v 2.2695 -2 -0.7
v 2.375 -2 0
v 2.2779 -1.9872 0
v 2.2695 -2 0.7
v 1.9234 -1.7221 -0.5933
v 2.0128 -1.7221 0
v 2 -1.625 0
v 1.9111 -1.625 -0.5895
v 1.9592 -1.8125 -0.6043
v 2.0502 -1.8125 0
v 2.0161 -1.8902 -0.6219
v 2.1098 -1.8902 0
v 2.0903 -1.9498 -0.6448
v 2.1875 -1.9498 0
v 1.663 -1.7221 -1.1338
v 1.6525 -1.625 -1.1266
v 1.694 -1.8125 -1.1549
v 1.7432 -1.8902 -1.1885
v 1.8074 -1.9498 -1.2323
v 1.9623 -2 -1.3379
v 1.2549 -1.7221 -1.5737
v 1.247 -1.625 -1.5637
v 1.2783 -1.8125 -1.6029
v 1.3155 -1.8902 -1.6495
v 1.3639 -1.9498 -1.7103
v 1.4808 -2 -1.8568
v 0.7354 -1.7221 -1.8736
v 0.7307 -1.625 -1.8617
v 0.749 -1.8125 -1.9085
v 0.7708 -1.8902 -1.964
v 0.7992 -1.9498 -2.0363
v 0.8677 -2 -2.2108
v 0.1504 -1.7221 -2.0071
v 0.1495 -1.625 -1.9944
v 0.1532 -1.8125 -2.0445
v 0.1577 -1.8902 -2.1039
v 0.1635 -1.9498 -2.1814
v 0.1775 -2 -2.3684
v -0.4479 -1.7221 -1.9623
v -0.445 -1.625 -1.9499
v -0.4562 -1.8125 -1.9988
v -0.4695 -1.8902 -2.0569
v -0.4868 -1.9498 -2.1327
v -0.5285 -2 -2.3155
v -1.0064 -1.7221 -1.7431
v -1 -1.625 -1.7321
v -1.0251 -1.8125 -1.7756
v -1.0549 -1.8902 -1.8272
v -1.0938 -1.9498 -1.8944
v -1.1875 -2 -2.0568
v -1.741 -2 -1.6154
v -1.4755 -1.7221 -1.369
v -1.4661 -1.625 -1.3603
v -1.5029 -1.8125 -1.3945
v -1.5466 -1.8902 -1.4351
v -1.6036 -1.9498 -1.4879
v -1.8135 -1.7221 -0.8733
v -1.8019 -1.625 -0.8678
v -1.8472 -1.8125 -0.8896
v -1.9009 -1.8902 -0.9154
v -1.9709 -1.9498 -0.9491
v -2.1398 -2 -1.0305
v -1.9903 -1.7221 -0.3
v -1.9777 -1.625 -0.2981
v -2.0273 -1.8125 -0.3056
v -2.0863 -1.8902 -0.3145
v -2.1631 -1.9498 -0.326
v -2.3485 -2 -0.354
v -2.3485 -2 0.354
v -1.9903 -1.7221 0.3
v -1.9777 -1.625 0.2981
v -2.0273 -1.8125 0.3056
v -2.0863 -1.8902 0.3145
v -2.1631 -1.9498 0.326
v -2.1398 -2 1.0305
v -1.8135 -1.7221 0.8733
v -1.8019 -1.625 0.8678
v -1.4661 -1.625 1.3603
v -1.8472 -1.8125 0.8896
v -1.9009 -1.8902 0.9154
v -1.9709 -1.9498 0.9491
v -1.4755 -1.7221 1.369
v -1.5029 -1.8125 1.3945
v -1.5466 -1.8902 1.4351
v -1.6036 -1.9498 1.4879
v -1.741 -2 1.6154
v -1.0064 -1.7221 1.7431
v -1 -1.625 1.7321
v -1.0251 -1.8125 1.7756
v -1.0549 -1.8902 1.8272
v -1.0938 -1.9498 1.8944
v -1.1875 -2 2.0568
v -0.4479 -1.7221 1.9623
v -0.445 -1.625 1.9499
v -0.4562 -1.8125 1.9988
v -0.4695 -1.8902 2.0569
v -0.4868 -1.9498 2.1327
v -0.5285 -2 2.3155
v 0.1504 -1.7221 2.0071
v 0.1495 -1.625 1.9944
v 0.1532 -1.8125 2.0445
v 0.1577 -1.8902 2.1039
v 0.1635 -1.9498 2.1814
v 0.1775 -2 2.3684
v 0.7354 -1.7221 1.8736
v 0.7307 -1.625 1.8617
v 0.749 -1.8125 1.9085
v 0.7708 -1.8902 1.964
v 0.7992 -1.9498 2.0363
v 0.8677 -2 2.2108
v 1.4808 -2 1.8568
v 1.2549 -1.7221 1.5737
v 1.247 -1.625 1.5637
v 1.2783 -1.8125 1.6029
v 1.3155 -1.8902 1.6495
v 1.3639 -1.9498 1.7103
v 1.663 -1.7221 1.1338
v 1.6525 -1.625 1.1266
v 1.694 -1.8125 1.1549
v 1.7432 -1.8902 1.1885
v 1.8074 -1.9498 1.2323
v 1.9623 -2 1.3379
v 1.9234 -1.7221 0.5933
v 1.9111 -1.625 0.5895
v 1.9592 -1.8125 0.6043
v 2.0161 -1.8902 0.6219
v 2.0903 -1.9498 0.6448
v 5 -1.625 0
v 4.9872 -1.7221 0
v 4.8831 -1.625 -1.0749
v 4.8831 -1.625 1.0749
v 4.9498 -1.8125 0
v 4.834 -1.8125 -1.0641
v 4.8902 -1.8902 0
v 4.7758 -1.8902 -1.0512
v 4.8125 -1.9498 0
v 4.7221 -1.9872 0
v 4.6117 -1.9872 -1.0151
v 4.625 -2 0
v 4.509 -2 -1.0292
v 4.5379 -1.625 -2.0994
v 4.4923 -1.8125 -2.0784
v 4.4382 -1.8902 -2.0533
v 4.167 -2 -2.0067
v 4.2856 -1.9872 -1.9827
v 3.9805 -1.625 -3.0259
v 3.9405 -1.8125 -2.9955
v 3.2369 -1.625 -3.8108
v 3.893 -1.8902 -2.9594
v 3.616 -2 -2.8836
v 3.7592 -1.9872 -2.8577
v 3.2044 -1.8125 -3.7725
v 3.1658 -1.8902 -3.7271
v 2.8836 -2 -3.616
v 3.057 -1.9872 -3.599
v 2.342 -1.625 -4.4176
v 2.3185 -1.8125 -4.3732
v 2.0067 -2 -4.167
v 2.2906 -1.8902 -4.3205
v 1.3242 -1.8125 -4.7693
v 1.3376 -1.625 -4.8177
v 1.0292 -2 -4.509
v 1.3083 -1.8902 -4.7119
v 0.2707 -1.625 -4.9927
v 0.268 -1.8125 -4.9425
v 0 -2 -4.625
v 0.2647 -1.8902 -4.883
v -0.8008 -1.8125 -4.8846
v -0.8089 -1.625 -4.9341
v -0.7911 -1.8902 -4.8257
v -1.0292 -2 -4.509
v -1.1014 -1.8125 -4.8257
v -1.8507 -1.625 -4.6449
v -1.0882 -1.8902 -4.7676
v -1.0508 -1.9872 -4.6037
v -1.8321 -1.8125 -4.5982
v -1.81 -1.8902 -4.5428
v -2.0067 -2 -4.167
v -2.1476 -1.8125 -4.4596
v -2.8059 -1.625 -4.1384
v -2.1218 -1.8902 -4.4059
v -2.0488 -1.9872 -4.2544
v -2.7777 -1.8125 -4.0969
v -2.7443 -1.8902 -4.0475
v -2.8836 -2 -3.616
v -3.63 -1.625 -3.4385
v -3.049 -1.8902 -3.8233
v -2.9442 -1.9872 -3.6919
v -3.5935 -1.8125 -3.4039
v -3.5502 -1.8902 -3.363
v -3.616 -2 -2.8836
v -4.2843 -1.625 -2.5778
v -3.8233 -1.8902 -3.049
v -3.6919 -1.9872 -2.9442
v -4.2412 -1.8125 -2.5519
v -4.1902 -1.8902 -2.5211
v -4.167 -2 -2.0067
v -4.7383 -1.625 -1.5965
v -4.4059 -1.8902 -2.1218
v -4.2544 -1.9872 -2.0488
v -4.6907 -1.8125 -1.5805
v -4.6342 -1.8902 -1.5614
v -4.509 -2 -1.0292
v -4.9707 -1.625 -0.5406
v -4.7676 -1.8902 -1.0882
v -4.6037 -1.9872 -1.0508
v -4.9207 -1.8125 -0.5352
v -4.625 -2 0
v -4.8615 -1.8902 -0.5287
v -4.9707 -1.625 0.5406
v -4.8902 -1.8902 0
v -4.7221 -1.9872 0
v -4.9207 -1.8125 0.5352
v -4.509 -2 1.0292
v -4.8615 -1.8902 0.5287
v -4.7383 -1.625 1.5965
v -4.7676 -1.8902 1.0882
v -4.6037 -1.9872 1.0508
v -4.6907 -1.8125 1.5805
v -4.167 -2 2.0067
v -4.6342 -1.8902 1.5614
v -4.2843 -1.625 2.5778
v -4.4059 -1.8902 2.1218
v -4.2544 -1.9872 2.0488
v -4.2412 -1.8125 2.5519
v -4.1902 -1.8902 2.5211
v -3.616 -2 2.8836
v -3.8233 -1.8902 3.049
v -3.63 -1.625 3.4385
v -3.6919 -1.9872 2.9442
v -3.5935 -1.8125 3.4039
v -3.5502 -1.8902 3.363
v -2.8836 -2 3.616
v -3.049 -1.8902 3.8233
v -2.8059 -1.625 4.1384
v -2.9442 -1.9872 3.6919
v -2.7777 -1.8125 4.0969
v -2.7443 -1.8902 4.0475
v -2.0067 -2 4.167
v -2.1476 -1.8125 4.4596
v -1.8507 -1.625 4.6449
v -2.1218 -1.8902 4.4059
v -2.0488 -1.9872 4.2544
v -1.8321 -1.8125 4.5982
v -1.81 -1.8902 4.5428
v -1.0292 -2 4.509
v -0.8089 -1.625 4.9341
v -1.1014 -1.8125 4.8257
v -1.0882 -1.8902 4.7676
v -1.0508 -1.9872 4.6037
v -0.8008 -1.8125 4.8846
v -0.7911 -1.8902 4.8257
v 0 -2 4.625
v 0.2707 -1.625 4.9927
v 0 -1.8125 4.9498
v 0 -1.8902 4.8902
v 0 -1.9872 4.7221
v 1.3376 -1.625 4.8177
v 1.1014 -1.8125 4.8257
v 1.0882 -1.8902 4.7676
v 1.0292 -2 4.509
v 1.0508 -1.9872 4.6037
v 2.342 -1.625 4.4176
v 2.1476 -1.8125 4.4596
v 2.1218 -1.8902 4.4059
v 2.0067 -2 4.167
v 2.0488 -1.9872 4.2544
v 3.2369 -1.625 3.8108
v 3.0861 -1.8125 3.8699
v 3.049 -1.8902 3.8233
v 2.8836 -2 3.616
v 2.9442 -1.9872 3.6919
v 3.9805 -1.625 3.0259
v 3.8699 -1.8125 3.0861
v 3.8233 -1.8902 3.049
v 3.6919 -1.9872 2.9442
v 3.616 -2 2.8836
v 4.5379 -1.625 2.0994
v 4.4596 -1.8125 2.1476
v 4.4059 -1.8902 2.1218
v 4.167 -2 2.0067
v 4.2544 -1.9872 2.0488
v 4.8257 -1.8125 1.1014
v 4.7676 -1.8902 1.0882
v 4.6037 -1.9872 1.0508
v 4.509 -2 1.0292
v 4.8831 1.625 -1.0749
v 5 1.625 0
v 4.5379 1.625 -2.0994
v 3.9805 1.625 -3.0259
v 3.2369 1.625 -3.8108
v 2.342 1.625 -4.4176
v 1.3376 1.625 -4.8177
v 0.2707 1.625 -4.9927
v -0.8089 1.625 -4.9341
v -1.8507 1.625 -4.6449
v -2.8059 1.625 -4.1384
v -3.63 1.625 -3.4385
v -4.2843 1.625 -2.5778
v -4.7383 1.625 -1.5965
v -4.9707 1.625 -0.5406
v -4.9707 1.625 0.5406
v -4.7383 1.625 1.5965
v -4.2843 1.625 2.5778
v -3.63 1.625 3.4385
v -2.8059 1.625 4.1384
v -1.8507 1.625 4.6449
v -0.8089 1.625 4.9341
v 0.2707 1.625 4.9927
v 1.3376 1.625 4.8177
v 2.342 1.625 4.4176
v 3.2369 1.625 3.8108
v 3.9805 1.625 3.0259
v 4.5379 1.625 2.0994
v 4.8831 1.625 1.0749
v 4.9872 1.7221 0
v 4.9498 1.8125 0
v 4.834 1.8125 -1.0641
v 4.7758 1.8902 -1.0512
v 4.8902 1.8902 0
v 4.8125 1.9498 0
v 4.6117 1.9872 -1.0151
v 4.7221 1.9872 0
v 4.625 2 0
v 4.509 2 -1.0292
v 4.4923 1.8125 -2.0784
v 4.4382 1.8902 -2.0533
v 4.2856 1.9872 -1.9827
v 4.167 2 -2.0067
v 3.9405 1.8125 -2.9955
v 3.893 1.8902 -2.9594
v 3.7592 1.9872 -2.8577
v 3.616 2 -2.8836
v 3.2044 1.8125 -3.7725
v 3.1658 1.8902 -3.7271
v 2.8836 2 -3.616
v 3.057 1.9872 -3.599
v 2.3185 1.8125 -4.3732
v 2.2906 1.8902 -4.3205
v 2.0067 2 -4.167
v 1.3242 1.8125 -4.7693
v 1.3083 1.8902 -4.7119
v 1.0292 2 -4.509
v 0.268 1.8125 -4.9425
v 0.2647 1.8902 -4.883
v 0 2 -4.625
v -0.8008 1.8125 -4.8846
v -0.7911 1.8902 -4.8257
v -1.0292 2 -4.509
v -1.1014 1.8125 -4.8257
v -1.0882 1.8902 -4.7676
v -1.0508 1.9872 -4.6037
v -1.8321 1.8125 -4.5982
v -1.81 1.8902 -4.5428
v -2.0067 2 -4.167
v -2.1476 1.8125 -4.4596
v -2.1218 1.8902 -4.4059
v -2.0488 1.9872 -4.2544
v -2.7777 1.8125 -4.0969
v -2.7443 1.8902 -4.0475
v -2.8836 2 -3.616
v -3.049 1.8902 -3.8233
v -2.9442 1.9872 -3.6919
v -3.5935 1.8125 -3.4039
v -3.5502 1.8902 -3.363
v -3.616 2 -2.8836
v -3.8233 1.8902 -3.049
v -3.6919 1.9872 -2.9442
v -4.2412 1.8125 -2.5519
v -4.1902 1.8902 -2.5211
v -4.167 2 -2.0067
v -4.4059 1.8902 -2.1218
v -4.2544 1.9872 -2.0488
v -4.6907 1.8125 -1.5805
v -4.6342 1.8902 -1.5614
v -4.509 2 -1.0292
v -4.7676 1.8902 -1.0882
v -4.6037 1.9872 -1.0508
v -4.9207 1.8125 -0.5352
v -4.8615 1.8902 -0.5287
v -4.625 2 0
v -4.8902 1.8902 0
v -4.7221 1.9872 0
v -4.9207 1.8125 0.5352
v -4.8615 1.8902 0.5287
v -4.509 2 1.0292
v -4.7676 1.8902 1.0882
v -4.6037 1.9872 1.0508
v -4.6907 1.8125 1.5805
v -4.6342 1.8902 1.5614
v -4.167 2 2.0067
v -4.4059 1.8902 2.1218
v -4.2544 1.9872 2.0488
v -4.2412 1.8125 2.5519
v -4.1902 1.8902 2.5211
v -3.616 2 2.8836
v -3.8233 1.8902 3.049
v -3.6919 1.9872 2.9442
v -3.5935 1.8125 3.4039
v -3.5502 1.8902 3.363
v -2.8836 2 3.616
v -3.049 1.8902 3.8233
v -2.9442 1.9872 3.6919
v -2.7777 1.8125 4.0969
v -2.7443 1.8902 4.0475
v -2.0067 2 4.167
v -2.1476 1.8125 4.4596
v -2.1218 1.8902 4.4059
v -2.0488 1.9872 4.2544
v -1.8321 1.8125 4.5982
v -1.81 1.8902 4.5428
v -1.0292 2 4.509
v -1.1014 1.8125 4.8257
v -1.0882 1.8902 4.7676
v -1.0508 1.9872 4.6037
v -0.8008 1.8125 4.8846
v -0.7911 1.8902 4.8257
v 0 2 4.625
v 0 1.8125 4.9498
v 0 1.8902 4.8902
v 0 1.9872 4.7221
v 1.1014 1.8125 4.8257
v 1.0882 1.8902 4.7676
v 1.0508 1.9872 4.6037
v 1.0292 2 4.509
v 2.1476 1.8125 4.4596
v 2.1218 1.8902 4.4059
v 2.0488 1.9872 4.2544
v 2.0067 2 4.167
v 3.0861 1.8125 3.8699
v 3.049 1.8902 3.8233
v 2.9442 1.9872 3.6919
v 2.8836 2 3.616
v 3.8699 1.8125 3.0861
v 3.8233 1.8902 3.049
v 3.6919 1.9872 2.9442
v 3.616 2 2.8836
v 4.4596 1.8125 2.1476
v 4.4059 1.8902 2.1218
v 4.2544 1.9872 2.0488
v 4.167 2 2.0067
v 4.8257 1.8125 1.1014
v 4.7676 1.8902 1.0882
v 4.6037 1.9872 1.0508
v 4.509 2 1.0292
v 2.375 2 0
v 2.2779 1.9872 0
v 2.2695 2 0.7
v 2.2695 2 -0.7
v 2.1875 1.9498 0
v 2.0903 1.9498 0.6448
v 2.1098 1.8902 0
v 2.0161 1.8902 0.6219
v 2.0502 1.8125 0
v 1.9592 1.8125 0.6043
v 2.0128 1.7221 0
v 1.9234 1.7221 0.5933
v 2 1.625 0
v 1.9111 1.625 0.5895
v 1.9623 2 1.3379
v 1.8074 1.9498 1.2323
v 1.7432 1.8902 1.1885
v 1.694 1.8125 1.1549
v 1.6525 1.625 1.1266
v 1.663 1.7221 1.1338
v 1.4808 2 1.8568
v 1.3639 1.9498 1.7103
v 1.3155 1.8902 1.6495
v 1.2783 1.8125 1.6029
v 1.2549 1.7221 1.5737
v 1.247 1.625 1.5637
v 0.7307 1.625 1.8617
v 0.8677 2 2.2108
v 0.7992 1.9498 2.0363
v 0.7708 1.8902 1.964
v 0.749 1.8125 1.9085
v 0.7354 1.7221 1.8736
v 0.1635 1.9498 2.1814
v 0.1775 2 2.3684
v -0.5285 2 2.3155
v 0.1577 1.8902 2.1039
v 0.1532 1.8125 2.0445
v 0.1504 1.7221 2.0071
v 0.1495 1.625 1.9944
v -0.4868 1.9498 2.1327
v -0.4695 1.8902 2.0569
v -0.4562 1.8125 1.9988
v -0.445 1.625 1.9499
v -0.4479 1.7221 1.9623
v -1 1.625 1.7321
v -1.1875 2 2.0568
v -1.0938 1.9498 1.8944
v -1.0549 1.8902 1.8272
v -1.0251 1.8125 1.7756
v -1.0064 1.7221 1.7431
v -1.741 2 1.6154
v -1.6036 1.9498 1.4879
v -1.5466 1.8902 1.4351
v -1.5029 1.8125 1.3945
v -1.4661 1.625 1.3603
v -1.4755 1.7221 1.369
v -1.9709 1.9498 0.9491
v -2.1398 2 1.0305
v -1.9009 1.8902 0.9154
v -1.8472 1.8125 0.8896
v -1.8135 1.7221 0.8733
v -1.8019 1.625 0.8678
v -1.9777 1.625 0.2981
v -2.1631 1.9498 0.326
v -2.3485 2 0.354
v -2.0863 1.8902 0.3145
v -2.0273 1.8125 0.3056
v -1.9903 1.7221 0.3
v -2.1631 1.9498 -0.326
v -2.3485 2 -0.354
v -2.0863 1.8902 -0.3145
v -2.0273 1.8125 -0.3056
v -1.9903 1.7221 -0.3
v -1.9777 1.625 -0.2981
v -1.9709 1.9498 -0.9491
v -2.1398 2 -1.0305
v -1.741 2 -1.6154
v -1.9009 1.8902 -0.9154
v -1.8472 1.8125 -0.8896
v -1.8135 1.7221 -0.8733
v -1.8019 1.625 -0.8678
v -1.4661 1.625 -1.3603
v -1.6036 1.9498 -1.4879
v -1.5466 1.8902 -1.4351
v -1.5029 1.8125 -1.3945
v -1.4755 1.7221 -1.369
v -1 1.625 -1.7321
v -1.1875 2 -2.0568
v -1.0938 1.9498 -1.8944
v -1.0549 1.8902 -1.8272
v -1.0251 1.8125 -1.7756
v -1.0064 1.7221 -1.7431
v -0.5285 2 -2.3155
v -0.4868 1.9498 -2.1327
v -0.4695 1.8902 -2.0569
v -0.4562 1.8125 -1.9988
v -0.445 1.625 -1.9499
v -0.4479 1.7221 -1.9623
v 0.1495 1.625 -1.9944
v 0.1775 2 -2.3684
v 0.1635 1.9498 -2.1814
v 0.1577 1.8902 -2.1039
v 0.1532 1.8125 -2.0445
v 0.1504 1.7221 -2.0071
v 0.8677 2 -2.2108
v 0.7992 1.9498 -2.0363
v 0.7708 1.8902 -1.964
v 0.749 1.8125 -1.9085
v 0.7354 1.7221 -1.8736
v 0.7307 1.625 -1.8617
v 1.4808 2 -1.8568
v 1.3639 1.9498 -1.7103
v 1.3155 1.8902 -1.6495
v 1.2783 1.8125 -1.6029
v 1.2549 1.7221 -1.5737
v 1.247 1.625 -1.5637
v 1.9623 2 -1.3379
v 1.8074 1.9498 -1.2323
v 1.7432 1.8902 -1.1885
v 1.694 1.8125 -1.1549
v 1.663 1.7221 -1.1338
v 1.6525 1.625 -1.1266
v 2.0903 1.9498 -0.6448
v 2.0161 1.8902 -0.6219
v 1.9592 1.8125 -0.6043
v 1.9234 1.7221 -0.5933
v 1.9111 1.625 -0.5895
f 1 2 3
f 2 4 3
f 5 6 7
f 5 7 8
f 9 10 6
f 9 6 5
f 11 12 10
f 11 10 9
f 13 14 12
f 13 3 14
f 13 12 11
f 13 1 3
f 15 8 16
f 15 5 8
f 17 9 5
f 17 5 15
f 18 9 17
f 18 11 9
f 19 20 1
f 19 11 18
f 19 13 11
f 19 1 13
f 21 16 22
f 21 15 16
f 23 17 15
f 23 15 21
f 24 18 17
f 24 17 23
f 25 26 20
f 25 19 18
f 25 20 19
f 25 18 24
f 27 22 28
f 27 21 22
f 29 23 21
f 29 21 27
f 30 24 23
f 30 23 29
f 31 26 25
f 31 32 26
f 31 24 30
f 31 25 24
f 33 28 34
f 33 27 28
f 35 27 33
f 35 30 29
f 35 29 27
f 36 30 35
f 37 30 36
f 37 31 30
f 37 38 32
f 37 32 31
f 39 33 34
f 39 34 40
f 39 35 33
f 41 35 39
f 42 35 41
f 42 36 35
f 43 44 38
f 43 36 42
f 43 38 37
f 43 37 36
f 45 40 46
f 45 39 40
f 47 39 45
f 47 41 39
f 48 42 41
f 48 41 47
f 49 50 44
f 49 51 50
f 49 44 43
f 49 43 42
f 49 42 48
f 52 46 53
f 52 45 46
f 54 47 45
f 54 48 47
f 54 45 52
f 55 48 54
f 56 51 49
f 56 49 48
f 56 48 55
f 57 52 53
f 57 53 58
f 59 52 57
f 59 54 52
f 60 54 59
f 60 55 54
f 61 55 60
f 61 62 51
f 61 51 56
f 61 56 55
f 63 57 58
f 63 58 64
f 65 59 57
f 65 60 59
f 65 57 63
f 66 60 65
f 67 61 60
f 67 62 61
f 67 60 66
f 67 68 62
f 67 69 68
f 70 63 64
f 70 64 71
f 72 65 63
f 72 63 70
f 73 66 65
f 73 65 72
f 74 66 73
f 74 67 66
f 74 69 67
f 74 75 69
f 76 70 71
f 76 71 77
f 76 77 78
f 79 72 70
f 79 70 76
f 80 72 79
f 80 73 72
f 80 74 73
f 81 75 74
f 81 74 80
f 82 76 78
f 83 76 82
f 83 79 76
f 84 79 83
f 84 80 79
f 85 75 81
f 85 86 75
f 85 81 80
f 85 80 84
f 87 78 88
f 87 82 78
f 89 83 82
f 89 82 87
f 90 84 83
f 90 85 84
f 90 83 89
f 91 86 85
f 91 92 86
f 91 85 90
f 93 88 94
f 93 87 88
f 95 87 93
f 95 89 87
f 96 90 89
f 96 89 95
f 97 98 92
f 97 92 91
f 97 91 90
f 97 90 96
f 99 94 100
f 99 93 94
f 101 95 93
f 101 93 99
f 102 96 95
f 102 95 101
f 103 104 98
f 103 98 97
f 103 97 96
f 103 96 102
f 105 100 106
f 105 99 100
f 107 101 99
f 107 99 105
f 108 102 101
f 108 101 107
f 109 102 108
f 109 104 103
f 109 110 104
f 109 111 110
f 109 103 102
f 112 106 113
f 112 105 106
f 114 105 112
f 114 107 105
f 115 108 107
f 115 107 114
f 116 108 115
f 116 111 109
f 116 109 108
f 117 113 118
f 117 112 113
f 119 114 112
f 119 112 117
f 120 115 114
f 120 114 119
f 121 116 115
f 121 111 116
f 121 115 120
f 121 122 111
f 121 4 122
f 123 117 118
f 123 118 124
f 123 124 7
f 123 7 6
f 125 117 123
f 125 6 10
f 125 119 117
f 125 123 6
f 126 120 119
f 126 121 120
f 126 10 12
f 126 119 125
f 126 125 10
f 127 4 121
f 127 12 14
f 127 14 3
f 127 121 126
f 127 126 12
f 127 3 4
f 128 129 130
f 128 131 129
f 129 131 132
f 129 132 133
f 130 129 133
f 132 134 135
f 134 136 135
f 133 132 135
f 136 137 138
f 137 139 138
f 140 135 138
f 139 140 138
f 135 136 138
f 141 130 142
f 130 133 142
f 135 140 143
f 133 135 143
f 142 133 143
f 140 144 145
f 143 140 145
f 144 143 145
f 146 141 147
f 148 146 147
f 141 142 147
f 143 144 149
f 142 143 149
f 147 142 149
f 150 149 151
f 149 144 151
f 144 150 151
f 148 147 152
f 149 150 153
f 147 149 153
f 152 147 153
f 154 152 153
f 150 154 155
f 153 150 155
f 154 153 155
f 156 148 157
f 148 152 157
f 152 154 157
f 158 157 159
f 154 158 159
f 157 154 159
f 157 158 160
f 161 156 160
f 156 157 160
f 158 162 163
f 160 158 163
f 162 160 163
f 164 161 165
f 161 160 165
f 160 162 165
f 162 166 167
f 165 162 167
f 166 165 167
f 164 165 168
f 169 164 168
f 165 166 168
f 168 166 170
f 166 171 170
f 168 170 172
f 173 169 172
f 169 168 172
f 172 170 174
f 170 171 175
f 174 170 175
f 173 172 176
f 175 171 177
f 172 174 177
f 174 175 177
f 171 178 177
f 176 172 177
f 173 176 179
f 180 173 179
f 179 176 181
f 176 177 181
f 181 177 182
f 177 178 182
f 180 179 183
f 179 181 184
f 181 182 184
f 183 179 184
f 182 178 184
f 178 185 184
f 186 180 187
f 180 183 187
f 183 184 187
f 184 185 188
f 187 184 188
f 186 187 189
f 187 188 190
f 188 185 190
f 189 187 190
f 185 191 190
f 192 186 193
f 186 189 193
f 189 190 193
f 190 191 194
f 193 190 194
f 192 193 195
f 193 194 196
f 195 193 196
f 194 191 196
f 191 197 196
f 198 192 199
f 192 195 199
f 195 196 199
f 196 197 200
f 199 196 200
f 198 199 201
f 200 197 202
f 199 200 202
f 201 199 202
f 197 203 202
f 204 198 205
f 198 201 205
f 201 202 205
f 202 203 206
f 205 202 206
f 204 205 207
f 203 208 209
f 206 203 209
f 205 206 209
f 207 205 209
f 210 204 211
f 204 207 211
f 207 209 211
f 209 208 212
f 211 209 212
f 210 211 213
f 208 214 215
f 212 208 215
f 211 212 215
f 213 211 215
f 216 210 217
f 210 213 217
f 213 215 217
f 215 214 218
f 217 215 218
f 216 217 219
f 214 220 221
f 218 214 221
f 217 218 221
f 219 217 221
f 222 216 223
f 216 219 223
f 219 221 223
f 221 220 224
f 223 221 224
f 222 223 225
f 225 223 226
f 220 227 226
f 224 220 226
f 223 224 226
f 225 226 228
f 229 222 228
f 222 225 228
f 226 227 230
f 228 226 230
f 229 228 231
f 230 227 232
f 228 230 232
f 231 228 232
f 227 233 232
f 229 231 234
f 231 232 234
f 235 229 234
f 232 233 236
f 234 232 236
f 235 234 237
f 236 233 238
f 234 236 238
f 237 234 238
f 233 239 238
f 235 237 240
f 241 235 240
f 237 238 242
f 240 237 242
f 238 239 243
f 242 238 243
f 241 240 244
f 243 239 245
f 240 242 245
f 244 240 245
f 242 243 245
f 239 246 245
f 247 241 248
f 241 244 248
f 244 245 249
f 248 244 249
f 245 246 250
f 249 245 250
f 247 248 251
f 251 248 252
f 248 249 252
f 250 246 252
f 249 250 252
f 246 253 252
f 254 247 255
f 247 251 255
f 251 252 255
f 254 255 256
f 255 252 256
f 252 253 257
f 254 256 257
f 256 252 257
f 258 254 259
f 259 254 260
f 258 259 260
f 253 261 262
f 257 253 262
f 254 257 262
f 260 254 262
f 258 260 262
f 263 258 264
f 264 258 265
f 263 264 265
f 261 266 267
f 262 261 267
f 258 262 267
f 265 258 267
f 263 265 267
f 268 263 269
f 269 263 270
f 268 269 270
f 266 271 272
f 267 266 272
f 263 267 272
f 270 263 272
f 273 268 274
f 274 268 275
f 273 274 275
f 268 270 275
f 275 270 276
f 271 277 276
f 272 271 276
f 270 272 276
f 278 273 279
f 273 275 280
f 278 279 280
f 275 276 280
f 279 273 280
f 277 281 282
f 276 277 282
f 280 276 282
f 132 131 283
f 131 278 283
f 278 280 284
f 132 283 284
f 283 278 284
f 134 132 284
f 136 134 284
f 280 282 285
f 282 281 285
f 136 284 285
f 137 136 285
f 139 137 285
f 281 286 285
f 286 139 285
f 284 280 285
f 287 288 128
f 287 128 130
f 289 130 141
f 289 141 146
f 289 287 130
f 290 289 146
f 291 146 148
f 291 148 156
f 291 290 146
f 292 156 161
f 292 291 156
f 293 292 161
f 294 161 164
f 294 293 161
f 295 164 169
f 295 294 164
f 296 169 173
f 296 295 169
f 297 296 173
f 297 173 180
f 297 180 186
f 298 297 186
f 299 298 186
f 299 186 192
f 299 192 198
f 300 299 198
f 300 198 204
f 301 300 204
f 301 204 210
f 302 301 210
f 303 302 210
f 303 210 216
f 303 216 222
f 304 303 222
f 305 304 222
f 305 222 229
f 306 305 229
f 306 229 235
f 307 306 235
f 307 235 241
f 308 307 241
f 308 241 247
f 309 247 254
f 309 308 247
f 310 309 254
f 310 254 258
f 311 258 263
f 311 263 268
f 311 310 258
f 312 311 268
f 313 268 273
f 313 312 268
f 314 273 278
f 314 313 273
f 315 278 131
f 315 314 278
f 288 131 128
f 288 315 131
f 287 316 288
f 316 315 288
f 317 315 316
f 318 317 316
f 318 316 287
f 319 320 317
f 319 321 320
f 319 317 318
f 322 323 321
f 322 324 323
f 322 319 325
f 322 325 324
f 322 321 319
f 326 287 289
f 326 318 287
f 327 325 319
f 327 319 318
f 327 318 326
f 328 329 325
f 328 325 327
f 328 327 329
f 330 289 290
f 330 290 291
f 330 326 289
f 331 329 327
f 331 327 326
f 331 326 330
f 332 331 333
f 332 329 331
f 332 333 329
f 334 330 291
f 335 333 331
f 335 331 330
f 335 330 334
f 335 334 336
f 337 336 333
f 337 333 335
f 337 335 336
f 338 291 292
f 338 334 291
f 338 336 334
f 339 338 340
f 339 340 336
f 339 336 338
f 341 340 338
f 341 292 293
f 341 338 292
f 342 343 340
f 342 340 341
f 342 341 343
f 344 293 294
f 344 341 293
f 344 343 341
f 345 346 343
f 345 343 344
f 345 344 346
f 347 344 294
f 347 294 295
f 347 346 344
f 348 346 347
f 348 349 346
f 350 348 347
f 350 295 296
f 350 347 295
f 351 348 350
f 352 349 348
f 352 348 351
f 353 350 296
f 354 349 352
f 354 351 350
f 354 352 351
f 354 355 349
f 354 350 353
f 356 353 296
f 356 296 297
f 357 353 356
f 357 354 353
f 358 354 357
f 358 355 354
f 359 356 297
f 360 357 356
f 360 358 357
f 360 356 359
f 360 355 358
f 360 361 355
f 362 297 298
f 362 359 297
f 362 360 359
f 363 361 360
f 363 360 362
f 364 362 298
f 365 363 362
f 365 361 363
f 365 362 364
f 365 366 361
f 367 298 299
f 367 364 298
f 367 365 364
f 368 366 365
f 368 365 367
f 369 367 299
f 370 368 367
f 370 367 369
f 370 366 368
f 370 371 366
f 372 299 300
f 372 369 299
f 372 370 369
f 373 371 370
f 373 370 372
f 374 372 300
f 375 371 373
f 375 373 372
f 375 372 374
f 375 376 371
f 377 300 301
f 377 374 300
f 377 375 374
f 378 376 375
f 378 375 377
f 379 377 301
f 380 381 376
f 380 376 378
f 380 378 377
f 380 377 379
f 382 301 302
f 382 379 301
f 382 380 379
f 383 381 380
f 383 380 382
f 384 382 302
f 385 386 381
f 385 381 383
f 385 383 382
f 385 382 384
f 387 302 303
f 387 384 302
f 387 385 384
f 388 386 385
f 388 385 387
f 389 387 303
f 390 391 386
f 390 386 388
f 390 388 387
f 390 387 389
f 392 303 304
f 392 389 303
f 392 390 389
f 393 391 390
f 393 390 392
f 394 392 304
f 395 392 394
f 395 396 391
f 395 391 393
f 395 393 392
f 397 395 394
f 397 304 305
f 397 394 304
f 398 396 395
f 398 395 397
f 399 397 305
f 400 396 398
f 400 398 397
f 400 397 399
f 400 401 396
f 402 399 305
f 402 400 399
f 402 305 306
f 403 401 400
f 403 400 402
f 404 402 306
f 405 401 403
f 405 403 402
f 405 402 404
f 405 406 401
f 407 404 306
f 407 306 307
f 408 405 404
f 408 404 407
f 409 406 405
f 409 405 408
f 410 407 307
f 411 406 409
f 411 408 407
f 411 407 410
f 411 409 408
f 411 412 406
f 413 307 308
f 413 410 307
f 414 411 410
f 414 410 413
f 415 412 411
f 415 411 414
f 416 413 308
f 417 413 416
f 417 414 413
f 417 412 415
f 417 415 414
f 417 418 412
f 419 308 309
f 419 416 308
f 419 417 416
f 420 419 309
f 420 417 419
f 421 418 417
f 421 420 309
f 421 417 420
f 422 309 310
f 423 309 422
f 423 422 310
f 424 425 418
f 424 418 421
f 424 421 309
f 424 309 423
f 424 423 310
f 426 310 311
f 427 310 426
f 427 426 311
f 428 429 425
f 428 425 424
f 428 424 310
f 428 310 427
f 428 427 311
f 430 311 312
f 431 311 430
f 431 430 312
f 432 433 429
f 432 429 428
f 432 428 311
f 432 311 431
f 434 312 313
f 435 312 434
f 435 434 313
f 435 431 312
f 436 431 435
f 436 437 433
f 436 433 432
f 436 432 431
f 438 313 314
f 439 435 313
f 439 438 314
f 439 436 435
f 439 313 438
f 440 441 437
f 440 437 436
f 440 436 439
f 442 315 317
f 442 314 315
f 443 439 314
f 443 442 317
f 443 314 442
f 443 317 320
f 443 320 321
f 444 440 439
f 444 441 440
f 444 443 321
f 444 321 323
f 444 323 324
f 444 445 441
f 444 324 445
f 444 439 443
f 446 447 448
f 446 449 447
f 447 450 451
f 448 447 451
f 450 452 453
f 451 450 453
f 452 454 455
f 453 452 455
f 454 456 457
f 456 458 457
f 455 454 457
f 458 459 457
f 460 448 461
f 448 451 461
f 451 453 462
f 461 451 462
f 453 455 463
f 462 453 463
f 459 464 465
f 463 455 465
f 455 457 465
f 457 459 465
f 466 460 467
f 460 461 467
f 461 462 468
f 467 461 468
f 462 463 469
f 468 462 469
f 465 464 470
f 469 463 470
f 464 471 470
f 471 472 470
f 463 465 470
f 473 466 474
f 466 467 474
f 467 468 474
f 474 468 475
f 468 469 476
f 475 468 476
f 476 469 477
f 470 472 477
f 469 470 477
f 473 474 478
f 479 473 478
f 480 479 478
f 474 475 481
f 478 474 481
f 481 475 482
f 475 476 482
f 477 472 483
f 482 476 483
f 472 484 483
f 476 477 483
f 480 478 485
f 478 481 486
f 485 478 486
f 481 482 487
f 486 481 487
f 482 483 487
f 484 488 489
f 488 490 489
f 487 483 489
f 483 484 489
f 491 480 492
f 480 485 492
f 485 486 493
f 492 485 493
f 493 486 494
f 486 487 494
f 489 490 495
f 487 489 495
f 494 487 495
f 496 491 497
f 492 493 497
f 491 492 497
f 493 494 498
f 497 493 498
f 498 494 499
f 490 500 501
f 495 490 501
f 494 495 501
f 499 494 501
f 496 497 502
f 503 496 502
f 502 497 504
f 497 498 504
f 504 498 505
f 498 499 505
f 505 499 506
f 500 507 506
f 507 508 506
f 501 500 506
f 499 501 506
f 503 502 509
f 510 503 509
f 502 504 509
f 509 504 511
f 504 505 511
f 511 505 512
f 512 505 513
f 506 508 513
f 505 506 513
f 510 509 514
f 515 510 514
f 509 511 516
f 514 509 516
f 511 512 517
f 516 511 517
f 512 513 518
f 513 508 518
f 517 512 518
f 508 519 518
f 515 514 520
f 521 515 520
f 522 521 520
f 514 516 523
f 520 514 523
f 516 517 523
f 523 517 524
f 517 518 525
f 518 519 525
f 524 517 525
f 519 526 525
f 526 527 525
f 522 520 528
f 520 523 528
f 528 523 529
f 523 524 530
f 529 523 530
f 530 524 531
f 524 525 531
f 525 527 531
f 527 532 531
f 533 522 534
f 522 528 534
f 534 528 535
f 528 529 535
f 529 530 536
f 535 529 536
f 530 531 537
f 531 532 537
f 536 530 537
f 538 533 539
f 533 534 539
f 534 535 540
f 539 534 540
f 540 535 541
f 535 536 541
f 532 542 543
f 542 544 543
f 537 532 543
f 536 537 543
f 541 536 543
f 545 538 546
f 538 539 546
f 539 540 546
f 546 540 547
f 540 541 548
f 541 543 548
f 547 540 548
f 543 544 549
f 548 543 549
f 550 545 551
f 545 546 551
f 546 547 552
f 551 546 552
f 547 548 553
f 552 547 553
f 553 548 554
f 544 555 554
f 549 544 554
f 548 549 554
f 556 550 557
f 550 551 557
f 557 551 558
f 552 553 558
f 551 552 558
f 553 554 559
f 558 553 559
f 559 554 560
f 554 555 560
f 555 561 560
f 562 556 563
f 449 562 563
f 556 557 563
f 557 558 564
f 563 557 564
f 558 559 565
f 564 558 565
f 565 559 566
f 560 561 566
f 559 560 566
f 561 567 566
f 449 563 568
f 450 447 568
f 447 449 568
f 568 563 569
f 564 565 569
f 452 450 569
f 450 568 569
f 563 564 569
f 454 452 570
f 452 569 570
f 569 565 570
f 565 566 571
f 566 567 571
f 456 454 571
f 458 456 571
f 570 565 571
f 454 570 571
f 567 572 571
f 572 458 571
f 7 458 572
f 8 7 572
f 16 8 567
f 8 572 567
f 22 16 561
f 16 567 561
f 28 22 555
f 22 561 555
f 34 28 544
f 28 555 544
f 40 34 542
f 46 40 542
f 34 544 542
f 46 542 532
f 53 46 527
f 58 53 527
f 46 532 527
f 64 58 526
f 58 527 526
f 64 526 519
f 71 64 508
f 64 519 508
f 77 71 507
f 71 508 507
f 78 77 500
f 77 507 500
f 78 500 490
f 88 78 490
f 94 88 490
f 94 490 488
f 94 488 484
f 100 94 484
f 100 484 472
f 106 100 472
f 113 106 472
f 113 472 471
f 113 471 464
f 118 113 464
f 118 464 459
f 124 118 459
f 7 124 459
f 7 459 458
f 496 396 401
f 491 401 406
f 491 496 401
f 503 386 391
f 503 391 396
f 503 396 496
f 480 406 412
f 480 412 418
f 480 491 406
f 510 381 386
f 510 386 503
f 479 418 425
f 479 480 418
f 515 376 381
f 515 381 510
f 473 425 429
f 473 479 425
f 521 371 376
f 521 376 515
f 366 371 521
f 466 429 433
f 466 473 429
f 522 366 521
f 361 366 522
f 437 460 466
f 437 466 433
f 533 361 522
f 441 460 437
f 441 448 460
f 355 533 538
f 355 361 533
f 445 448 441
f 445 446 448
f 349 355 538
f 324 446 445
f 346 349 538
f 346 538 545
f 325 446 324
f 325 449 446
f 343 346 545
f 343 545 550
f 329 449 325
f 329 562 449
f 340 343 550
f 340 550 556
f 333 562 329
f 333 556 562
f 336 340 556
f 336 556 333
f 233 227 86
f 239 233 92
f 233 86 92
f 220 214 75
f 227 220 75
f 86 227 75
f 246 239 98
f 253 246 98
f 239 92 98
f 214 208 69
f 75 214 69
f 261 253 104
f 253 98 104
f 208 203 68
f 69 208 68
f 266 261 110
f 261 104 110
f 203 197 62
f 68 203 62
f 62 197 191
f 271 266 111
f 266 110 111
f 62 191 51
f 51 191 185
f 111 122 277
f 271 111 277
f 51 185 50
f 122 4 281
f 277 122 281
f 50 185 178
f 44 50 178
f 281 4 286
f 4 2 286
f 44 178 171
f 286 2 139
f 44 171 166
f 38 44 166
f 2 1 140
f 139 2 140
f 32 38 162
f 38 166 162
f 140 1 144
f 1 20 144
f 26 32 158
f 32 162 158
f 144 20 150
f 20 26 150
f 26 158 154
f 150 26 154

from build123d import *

# Parameters (mm, degrees)
SKETCH1_R               = 5
BOSS_EXTRUDE1_DEPTH     = 2
SKETCH2_R               = 2
CUT_EXTRUDE1_DEPTH      = 3
CUT_EXTRUDE1_DEPTH_BACK = 3
FILLET1_R               = 0.375


with BuildPart() as part:
    # Sketch1 → Boss-Extrude1 (new body, symmetric)
    with BuildSketch(Plane(origin=(0, 0, 0), x_dir=(1, 0, 0), z_dir=(0, 1, 0))):
        Circle(SKETCH1_R)
    extrude(amount=BOSS_EXTRUDE1_DEPTH, both=True)

    # Sketch2 → Cut-Extrude1 (cut, two sides)
    with BuildSketch(Plane(origin=(0, 0, 0), x_dir=(1, 0, 0), z_dir=(0, 1, 0))) as cut_extrude1_sk:
        Circle(SKETCH2_R)
    extrude(amount=CUT_EXTRUDE1_DEPTH, mode=Mode.SUBTRACT)
    extrude(cut_extrude1_sk.sketch, amount=-CUT_EXTRUDE1_DEPTH_BACK, mode=Mode.SUBTRACT)

    # Fillet1
    fillet1_edges = [part.edges().sort_by_distance(p)[0] for p in [
        (-5, -2, 0),
        (-5, 2, 0),
        (-2, -2, 0),
        (-2, 2, 0),
    ]]
    fillet(fillet1_edges, radius=FILLET1_R)


solid = part.part
